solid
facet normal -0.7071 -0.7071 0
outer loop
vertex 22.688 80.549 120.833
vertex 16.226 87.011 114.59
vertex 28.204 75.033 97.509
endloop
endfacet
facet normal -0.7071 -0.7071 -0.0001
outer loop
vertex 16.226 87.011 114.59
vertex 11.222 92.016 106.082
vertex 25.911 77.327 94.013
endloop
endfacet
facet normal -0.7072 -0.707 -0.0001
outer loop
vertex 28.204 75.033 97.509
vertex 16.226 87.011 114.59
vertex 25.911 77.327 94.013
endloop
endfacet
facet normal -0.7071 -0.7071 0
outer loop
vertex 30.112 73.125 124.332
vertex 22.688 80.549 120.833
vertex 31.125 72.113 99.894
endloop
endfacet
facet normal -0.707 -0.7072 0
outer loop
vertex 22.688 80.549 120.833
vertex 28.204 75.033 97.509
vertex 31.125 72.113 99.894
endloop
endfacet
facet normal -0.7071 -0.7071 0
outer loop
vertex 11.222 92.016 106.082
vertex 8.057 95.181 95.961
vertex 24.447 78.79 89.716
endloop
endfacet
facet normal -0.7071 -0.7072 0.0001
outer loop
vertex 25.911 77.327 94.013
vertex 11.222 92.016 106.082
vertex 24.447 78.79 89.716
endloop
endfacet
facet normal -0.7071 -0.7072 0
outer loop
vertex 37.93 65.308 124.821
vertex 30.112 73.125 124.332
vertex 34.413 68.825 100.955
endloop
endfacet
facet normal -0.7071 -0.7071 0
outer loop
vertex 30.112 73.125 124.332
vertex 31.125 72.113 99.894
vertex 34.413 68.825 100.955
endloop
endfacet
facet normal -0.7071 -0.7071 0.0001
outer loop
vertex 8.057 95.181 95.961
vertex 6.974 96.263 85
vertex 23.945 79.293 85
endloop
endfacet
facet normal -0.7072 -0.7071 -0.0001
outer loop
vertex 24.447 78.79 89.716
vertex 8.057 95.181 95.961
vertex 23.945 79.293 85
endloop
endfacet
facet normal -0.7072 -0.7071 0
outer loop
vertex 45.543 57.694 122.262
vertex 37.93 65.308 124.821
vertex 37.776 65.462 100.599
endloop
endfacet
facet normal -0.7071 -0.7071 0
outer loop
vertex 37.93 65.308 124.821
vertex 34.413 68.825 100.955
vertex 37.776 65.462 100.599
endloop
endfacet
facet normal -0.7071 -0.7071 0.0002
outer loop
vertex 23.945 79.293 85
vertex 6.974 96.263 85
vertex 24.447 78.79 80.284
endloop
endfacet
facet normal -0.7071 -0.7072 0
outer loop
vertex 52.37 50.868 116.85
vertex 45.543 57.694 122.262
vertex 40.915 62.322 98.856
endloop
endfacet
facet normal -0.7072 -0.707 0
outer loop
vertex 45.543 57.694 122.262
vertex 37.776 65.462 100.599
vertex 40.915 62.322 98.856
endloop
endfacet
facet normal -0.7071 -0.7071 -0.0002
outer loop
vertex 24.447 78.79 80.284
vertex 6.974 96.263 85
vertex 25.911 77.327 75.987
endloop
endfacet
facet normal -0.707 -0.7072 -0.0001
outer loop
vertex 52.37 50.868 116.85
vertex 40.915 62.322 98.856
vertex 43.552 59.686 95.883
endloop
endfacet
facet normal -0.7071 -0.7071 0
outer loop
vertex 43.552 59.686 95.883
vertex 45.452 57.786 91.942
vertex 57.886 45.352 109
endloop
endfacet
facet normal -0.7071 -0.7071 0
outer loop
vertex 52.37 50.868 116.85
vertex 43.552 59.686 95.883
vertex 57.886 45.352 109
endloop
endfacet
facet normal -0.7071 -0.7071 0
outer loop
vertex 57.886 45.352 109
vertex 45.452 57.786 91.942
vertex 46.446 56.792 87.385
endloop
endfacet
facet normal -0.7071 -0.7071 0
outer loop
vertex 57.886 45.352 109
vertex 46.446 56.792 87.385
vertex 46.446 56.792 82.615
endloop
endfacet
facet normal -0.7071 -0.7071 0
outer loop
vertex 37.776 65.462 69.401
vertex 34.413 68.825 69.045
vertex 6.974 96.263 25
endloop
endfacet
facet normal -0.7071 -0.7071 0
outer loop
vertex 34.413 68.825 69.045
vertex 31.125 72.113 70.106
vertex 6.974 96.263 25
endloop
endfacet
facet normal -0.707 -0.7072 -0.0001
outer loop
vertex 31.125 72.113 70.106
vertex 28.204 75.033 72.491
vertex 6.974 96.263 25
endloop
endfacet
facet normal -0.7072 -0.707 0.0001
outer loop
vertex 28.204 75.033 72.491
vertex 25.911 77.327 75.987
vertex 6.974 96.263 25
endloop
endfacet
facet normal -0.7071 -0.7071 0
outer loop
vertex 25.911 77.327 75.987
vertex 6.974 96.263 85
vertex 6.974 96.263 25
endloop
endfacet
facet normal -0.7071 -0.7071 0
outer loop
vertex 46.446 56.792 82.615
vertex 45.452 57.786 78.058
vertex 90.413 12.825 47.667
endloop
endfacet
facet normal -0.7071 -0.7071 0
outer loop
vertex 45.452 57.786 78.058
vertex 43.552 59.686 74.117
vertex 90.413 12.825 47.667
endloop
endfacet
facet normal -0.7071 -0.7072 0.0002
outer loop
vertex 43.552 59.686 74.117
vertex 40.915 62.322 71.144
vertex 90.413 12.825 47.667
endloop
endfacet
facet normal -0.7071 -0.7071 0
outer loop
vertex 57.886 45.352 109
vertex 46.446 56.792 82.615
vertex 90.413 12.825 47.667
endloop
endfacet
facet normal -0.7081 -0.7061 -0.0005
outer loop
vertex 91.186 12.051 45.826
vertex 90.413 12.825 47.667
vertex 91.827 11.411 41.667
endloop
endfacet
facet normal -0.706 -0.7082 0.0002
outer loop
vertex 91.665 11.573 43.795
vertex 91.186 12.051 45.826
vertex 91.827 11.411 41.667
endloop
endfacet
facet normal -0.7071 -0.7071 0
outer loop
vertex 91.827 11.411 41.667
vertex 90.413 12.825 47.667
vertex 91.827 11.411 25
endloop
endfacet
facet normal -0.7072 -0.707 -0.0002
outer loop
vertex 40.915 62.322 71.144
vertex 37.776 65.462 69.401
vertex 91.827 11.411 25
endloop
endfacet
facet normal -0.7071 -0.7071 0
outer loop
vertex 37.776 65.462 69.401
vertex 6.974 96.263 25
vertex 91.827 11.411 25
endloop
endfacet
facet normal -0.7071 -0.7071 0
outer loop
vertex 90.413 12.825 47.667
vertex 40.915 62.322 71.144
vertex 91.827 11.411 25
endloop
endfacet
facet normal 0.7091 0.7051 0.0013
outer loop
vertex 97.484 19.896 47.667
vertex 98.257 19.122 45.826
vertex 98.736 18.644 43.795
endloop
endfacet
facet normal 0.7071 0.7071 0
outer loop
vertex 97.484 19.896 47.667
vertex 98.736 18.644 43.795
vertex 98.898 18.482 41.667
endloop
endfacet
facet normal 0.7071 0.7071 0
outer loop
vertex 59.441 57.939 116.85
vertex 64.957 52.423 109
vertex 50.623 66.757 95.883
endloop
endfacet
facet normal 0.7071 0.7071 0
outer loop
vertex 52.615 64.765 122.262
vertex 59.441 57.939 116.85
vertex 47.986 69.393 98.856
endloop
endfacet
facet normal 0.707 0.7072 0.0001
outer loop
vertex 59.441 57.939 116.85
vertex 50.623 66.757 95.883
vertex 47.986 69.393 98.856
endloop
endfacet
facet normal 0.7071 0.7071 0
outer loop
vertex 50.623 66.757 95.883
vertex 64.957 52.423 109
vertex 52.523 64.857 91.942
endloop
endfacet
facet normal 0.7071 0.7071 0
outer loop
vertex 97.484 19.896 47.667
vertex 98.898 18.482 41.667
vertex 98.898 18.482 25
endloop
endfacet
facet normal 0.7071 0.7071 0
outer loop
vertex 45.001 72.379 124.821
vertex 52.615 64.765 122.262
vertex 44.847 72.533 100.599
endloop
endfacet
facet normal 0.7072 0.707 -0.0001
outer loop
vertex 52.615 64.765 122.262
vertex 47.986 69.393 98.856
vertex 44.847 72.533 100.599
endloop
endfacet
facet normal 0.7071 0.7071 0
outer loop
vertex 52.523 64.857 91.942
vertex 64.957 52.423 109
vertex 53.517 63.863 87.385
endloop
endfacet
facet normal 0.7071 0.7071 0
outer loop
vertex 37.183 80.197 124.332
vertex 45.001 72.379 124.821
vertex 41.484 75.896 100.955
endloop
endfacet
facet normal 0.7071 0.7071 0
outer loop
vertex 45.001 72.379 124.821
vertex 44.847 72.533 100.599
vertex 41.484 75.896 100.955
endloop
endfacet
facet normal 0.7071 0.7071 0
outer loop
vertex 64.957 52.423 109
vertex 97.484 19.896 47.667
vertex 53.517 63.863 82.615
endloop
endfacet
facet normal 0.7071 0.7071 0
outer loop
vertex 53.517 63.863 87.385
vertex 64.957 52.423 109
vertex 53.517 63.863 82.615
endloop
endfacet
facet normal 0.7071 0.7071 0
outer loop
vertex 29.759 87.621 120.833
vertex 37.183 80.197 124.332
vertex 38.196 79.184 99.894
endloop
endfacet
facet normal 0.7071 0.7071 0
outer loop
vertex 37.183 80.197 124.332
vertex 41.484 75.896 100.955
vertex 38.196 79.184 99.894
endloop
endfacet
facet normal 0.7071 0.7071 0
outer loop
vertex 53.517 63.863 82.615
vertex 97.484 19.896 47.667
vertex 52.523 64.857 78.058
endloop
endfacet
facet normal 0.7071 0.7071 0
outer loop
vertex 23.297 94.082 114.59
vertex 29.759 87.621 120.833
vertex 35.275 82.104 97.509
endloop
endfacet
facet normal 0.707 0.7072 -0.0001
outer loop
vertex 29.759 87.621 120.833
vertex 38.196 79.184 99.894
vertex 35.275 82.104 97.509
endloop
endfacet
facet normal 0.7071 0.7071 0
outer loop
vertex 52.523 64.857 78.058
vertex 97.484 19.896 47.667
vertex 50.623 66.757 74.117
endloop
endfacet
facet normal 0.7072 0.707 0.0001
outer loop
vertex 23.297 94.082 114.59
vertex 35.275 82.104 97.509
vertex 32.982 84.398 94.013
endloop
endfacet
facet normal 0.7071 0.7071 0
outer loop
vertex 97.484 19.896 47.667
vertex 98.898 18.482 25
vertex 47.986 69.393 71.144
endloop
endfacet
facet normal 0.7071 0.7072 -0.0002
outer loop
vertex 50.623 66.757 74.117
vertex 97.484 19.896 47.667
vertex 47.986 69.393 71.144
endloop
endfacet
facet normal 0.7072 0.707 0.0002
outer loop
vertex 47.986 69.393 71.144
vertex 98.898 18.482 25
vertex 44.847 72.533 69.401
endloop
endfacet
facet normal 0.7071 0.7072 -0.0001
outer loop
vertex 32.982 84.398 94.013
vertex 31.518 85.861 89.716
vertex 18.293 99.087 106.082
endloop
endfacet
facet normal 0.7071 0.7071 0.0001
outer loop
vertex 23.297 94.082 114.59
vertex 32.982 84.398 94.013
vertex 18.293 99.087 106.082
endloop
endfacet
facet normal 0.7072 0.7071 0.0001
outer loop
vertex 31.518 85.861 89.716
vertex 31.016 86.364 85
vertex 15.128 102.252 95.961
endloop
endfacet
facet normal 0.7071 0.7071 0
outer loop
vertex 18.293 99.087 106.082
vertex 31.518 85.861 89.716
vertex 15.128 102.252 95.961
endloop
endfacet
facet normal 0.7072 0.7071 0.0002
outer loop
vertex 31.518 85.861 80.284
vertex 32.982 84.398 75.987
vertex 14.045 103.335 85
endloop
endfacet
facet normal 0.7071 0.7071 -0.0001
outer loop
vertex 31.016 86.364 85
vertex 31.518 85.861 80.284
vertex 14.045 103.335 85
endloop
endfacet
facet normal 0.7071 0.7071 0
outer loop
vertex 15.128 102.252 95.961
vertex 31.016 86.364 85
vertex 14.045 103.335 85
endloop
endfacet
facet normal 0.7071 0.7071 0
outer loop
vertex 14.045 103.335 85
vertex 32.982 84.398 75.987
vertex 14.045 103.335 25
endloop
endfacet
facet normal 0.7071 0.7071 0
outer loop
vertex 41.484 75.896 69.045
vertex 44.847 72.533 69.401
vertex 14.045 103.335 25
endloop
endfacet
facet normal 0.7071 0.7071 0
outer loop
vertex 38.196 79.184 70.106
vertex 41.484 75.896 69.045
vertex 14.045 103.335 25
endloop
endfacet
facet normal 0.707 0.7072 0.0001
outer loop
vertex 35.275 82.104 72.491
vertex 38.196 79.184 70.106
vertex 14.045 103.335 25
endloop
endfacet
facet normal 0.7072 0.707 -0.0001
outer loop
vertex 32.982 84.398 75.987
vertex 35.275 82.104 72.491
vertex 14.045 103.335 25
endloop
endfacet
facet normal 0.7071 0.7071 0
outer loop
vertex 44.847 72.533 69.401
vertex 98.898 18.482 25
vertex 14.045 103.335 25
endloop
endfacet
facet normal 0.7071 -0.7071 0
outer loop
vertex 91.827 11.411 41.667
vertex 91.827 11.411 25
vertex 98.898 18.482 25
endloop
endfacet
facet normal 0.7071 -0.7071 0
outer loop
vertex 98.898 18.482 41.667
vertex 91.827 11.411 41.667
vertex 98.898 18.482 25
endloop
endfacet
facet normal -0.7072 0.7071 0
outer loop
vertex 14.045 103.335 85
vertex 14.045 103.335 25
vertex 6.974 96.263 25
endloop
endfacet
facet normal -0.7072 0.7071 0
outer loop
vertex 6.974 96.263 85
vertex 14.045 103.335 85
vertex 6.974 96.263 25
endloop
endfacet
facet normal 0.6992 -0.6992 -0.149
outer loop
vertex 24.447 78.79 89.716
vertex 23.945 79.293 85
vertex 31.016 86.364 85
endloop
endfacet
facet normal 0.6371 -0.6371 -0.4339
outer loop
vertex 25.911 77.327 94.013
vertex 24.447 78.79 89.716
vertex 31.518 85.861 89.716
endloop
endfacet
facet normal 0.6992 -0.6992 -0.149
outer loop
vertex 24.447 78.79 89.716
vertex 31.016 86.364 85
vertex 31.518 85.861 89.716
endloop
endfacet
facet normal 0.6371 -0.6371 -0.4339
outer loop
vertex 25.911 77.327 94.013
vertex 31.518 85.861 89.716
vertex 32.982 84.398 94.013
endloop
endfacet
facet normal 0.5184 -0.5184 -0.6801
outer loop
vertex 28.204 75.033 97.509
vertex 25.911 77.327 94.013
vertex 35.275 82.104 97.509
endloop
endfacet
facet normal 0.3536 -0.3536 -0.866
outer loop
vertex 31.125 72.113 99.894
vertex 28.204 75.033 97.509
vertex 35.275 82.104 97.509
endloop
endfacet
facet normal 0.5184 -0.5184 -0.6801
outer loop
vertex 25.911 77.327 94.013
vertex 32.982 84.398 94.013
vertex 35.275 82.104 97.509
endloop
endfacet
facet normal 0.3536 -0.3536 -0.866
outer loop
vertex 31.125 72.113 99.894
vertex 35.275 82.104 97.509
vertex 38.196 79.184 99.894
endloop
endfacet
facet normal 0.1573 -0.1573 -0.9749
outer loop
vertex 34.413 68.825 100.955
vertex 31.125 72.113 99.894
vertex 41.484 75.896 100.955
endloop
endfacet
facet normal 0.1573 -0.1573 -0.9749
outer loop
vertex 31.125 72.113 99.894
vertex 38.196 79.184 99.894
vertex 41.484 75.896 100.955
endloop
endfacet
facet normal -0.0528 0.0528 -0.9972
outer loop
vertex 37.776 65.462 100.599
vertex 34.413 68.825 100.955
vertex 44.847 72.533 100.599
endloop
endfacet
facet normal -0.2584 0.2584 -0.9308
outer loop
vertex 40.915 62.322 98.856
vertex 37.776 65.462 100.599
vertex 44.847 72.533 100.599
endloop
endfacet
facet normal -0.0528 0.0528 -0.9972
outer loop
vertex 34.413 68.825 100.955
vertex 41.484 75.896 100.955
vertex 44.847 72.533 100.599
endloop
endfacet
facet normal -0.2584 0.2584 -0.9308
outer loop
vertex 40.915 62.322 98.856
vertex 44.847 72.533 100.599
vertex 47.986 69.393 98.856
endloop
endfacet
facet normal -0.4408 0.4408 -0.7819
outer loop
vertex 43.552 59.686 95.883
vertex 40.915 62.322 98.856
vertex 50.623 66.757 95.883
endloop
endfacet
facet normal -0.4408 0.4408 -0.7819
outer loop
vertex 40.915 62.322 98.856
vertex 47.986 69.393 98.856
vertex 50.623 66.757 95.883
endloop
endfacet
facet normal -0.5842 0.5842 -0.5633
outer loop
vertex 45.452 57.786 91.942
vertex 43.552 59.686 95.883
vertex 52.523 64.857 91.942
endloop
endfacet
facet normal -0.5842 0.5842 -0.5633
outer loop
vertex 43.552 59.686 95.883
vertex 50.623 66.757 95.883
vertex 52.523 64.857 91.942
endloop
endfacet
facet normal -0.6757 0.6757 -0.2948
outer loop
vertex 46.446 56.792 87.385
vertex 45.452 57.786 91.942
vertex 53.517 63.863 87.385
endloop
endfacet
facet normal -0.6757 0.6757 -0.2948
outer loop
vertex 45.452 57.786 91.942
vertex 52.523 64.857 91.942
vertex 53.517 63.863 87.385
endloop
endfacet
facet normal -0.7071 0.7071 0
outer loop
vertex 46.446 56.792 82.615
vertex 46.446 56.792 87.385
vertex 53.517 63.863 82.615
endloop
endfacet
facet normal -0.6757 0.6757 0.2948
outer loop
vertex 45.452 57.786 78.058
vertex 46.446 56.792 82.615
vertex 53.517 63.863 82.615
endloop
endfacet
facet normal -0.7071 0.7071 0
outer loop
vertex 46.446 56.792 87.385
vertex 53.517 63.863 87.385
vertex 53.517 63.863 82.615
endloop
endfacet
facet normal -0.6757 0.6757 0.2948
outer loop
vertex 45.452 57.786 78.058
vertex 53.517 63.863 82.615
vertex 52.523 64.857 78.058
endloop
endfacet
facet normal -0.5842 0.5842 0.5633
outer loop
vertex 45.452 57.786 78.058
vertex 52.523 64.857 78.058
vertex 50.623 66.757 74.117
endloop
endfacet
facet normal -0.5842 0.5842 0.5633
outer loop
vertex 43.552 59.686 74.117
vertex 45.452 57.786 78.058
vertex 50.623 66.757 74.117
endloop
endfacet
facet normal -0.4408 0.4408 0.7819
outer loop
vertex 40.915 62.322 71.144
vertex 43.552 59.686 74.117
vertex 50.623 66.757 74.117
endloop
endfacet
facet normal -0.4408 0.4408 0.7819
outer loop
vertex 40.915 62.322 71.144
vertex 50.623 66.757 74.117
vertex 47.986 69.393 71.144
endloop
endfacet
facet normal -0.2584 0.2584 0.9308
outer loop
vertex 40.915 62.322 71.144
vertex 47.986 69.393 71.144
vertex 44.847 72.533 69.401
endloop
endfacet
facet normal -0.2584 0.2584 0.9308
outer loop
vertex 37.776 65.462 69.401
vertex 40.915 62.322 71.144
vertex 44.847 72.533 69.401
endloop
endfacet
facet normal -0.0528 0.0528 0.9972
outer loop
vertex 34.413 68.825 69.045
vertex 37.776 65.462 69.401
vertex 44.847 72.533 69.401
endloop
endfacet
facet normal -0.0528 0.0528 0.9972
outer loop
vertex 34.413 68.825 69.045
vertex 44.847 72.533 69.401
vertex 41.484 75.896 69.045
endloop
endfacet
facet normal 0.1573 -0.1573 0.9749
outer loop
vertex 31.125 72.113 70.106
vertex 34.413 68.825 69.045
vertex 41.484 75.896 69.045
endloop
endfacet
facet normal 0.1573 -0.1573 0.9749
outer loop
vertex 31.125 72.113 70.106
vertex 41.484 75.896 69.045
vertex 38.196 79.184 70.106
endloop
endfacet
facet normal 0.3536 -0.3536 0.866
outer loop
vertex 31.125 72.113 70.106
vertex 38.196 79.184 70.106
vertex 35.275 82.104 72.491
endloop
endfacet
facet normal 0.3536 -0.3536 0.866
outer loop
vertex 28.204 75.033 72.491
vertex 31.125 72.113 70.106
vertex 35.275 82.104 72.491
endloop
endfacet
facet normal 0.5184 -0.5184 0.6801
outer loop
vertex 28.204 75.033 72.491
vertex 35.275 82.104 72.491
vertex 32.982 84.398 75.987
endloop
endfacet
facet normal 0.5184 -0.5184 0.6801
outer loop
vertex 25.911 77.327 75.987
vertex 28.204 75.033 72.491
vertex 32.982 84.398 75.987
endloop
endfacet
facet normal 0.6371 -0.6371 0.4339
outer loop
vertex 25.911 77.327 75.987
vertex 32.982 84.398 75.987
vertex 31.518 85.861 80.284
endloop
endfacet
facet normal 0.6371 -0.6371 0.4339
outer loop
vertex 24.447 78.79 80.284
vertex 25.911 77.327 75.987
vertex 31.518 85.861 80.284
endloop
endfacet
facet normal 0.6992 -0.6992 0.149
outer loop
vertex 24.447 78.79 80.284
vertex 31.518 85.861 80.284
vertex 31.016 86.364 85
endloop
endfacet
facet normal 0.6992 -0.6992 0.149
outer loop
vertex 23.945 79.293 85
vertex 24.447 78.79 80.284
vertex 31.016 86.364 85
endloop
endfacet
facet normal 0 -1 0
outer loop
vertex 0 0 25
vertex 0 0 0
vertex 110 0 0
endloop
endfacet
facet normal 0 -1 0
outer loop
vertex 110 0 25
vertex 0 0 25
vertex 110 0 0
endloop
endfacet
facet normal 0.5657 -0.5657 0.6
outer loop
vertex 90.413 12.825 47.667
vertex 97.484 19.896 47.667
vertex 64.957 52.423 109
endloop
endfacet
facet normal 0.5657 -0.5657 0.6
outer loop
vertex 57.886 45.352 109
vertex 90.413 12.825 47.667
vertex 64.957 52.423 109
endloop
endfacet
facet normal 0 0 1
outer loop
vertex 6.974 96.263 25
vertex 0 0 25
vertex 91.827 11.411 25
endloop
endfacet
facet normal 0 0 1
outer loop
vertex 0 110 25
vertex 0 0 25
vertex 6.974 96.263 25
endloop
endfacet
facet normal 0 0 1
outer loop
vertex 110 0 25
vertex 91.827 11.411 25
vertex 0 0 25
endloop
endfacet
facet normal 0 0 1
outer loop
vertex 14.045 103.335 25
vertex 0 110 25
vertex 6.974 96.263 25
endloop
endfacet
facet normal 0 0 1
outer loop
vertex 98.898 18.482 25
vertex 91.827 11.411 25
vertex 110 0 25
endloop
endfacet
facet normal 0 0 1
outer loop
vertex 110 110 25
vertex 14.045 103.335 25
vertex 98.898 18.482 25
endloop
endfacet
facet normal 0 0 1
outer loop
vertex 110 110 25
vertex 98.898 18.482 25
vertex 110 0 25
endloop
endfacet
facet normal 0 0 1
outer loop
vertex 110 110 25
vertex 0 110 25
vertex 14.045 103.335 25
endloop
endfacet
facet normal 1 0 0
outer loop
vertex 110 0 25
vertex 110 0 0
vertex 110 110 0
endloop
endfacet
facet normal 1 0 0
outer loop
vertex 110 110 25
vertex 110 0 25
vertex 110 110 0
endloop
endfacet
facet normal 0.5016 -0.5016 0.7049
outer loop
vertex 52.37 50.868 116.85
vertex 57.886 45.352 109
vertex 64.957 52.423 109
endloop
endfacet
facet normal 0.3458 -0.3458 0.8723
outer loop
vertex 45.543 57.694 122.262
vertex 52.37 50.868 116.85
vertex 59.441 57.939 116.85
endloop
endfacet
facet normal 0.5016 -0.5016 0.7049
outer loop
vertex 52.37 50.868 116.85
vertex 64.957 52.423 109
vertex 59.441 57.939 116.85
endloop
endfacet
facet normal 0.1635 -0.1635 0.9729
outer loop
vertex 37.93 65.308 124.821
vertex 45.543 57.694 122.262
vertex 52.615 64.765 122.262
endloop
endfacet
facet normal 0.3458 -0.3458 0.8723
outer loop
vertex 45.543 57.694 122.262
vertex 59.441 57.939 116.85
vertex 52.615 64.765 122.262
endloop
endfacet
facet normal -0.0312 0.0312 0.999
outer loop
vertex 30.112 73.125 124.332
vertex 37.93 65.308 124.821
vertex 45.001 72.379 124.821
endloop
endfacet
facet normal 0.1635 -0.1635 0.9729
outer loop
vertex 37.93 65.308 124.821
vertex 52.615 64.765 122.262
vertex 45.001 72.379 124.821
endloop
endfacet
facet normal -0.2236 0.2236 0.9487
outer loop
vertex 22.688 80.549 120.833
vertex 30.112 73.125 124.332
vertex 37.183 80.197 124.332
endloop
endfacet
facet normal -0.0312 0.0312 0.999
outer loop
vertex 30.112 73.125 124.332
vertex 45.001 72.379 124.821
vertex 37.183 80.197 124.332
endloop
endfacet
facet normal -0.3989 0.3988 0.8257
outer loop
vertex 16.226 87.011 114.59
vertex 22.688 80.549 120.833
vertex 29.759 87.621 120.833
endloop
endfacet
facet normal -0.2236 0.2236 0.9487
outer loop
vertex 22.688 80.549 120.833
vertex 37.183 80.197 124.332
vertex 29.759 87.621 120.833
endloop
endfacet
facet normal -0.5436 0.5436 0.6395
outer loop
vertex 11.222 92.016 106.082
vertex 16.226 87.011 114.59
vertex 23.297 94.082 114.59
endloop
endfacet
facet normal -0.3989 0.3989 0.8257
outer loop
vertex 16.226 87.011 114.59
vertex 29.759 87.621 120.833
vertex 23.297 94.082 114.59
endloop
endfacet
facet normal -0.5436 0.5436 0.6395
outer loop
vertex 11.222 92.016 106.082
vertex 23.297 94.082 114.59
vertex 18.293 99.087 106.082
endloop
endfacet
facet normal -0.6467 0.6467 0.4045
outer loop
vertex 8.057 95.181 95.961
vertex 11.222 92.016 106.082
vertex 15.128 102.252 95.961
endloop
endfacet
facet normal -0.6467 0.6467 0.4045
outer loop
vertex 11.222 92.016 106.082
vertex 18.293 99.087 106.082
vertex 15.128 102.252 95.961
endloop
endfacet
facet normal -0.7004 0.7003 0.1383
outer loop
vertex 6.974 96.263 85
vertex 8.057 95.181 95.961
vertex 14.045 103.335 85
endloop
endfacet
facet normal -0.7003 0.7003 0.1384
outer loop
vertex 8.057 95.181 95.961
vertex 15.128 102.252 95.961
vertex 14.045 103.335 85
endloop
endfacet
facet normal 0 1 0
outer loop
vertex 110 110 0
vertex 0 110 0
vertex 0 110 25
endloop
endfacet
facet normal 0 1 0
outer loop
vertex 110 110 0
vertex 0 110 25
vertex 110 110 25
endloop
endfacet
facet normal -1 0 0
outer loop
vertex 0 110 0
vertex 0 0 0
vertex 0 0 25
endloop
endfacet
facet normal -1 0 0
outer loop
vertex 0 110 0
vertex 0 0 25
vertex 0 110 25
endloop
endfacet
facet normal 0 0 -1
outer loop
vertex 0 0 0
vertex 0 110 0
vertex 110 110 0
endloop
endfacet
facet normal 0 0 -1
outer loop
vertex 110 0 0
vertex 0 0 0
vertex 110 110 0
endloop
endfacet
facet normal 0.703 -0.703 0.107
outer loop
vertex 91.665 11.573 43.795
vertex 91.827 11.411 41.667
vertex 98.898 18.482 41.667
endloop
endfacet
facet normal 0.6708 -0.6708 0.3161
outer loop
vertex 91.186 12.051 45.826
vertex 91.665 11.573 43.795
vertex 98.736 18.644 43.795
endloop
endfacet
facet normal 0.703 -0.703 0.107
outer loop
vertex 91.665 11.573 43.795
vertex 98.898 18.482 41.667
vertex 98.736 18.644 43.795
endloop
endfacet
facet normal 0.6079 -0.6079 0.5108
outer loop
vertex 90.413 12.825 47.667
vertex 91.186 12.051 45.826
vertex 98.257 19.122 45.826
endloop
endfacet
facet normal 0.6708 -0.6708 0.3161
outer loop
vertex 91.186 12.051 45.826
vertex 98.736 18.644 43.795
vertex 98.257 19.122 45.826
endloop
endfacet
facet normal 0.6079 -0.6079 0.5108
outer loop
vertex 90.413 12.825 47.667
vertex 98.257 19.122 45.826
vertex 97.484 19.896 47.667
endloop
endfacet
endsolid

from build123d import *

# Parameters (mm, degrees)
F0_W     = 110
F0_H     = 110
F1_DEPTH = 25
F3_DEPTH = 120
F4_R     = 16
F5_DEPTH = 25


with BuildPart() as f1:
    # F0 (on Top) → F1 (new body)
    with BuildSketch(Plane.XY):
        with Locations((55, 55)):
            Rectangle(F0_W, F0_H)
    extrude(amount=F1_DEPTH)

    # F2 (on face) → F3 (join)
    with BuildSketch(Plane.XY.offset(25)):
        Polygon((14.045202, 103.334524), (6.974134, 96.263456), (91.826948, 11.410642), (98.898016, 18.48171), align=None)
    extrude(amount=F3_DEPTH)

    # F4 (on face) → F5 (cut)
    with BuildSketch(Plane(origin=(58.689863, 58.689863, 0), x_dir=(-0.707107, 0.707107, 0), z_dir=(0.707107, 0.707107, 0))):
        with BuildLine():
            ThreePointArc((-8.862915, 109), (35.786196, 122.947332), (63.137085, 85))
            Line((63.137085, 85), (63.246235, 158.167794))
            Line((63.246235, 158.167794), (-56.862915, 158.167794))
            Line((-56.862915, 158.167794), (-56.862915, 41.666667))
            ThreePointArc((-56.862915, 41.666667), (-56.349748, 44.828944), (-54.862915, 47.666667))
            Line((-54.862915, 47.666667), (-8.862915, 109))
        make_face()
        with Locations((23.137085, 85)):
            Circle(F4_R)
    extrude(amount=-F5_DEPTH, mode=Mode.SUBTRACT)


solid = f1.part
